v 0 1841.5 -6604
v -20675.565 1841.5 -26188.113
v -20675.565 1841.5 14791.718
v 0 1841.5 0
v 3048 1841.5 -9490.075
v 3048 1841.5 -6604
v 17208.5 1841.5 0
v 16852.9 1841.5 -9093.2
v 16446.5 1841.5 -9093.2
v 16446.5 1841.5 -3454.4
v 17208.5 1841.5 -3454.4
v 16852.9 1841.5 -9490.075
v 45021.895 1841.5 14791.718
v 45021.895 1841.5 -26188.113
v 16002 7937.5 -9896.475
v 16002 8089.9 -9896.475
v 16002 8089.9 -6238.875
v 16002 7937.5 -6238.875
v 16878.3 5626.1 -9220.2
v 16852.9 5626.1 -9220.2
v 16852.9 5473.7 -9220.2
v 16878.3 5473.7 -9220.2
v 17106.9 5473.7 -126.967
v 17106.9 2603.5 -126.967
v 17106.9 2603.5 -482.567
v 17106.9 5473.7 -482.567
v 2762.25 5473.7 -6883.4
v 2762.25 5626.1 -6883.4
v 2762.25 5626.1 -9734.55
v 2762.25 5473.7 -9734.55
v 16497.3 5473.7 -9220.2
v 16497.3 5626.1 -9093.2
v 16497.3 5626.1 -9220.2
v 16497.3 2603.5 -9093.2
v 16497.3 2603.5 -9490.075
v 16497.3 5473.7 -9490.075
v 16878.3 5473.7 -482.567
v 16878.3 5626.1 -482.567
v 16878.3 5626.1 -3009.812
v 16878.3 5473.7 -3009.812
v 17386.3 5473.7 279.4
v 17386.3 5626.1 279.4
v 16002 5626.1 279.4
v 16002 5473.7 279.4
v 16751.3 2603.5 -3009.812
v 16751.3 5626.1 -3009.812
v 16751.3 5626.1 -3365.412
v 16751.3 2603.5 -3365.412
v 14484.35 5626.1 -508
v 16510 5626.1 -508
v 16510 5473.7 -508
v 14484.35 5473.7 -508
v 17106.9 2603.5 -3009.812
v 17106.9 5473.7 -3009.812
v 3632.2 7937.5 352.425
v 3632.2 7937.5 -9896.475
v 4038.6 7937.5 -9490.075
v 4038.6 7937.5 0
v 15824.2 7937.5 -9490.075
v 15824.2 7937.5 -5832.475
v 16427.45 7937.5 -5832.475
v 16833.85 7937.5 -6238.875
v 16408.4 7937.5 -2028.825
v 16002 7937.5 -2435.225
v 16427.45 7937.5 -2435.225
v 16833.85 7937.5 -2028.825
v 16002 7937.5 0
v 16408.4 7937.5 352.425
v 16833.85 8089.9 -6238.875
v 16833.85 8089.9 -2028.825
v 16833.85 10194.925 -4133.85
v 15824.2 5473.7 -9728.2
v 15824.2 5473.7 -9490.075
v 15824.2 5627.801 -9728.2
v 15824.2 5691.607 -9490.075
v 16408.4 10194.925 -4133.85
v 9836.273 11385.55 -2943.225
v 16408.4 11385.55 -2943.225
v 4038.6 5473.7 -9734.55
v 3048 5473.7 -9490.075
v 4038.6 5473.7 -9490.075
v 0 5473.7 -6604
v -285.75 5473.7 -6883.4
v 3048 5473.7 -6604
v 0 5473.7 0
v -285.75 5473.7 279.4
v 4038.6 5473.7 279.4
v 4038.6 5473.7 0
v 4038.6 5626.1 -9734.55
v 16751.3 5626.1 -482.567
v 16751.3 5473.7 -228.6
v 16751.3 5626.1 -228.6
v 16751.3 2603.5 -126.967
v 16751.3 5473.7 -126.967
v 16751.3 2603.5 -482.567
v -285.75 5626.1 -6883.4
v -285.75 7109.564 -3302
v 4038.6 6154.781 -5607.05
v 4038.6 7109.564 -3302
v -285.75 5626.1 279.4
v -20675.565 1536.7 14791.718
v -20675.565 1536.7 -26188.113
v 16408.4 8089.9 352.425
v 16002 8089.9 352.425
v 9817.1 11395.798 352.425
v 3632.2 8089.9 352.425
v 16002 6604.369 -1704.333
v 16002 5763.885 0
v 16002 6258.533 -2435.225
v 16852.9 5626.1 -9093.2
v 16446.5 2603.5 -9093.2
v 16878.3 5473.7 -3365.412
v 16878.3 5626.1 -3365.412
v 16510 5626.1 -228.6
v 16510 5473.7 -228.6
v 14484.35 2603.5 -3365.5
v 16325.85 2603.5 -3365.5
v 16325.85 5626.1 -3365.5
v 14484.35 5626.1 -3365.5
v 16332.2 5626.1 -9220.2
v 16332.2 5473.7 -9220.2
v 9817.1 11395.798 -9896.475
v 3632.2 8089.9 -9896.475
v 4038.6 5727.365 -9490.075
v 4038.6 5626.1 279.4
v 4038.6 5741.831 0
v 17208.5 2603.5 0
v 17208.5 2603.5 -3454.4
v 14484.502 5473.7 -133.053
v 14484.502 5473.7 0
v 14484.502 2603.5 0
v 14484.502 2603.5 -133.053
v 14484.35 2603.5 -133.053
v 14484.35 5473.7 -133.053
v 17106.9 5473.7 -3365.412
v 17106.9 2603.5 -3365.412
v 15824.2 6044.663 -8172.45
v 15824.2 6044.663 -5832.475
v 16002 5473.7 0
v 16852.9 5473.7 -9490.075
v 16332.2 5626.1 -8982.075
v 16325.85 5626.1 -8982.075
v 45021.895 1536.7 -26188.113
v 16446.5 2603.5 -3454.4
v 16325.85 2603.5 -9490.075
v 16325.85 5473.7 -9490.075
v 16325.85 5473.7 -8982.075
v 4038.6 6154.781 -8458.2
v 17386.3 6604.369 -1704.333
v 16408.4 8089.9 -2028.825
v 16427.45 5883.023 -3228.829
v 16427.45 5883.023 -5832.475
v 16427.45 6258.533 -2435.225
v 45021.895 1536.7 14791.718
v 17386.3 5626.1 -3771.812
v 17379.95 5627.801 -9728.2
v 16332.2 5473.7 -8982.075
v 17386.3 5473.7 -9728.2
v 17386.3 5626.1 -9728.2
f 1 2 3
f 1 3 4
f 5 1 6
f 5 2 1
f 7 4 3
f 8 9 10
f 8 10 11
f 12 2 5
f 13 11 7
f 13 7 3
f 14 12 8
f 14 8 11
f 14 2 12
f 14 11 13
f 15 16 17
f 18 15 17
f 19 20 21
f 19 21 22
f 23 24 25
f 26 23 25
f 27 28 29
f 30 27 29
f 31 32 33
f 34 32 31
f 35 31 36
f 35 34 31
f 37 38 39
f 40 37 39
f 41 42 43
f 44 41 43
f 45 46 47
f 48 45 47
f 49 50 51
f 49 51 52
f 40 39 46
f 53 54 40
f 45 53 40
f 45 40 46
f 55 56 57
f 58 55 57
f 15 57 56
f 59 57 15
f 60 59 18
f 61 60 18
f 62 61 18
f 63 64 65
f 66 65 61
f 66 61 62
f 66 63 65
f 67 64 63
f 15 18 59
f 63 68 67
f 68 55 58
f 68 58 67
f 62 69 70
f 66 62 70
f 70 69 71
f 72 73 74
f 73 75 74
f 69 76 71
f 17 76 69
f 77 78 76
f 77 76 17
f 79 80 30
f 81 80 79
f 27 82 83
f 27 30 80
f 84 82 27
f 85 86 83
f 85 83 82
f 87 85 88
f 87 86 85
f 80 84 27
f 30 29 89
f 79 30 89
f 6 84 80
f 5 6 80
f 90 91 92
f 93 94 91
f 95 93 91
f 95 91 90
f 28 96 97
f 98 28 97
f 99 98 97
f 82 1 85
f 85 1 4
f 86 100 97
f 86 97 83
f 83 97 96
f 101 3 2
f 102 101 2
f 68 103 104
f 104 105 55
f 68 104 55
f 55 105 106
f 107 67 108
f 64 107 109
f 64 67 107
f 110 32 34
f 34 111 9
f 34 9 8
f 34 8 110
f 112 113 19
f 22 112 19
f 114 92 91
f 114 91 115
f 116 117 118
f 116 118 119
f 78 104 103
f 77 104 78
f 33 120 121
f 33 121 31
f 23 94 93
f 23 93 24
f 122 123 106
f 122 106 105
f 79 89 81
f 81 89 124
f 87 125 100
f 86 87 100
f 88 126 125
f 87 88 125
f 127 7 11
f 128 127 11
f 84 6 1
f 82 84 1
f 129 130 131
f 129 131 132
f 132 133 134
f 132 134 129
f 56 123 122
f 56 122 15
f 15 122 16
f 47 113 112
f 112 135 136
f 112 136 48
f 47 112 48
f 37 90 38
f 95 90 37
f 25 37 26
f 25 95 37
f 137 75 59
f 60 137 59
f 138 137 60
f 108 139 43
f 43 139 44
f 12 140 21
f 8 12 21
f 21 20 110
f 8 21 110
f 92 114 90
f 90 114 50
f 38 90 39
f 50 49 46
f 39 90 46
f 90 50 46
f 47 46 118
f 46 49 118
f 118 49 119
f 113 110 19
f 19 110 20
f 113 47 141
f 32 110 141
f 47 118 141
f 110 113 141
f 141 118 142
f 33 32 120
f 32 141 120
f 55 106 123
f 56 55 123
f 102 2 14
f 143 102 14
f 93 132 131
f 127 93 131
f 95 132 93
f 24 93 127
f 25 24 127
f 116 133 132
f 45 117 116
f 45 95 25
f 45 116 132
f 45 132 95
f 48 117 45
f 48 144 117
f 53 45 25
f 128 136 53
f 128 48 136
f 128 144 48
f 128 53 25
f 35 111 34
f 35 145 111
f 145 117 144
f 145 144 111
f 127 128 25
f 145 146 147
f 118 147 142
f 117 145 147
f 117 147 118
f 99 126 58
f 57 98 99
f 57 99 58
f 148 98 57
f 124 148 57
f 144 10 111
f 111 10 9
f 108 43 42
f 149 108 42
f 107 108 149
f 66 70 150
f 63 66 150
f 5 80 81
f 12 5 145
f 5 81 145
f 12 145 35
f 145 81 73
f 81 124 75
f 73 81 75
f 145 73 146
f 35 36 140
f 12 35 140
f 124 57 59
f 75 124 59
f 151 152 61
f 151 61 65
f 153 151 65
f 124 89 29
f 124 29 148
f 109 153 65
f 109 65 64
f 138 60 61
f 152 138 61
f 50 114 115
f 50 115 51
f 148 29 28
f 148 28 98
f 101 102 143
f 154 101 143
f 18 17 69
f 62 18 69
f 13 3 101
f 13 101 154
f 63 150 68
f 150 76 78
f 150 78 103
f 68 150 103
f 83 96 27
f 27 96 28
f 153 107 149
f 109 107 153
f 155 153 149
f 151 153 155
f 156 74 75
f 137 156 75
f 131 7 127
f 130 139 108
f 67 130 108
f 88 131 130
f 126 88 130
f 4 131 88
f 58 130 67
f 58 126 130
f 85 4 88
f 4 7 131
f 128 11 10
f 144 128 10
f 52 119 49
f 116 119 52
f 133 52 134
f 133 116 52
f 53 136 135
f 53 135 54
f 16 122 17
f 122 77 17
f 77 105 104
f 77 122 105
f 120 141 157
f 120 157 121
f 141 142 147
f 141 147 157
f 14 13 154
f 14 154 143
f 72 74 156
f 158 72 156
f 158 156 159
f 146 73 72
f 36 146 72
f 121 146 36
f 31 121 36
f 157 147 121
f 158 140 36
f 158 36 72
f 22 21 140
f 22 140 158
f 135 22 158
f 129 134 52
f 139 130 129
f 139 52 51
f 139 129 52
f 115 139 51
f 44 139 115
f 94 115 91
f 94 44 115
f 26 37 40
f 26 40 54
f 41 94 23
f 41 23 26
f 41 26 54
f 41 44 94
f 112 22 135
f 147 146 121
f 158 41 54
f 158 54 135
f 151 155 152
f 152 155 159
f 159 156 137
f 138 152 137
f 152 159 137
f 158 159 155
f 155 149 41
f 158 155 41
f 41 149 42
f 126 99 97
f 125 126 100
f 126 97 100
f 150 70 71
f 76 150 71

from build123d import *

# Parameters (mm, degrees)
BOSS_EXTRUDE1_DEPTH              = 2603.5
BOSS_EXTRUDE2_DEPTH              = 3022.6
BOSS_EXTRUDE3_DEPTH              = 2463.8
SKETCH4_W                        = 65697.460420921
SKETCH4_H                        = 40979.830360303
BOSS_EXTRUDE4_DEPTH              = 304.8
SKETCH5_W                        = 21895.016639369
SKETCH5_H                        = 12322.560301516
CUT_EXTRUDE1_DEPTH               = 1905
BOSS_EXTRUDE5_REACH              = 52955.248
BOSS_EXTRUDE6_REACH              = 51905.327
CUT_EXTRUDE2_DEPTH               = 1276.35
BOSS_EXTRUDE7_REACH              = 51982.038
BOSS_EXTRUDE8_DEPTH              = 406.4
CUT_EXTRUDE3_DEPTH               = 11303
BOSS_EXTRUDE9_REACH              = 47146.859
BOSS_EXTRUDE10_START             = -6572.127481
BOSS_EXTRUDE10_DEPTH             = 6572.127481
SKETCH15_W                       = 355.6
SKETCH15_H                       = 355.6
BOSS_EXTRUDE11_DEPTH             = 3022.6
BOSS_EXTRUDE12_DEPTH             = 7362.952
CUT_EXTRUDE4_DEPTH               = 304.8
CUT_EXTRUDE4_DEPTH_BACK          = 1308.1
BOSS_EXTRUDE13_REACH             = 47384.657
BOSS_EXTRUDE13_DIRECTION_2_DEPTH = 254
SKETCH19_W                       = 14484.502299334
SKETCH19_H                       = 133.052541355
BOSS_EXTRUDE14_DEPTH             = 3022.6
SKETCH20_W                       = 10445.902299334
SKETCH20_H                       = 57.769049229
BOSS_EXTRUDE15_DEPTH             = 2601.214
SKETCH22_W                       = 53.975
SKETCH22_H                       = 2463.8
BOSS_EXTRUDE17_DEPTH             = 1517.497700666
BOSS_EXTRUDE18_DEPTH             = 3022.6
BOSS_EXTRUDE19_DEPTH             = 3784.6
BOSS_EXTRUDE20_DEPTH             = 152.4
BOSS_EXTRUDE21_DEPTH             = 152.4
SKETCH27_W                       = 171.45
SKETCH27_H                       = 2870.2
CUT_EXTRUDE5_DEPTH               = 405.13


with BuildPart() as part:
    # Sketch1 → Boss-Extrude1 (new body)
    with BuildSketch(Plane(origin=(0, 0, 0), x_dir=(1, 0, 0), z_dir=(0, 1, 0))):
        Polygon((0, 0), (17208.5, 0), (17208.5, 3454.4), (16446.5, 3454.4), (16446.5, 9093.2), (16852.9, 9093.2), (16852.9, 9448.8), (16446.5, 9448.8), (3048, 9448.8), (3048, 6604), (0, 6604), align=None)
    extrude(amount=BOSS_EXTRUDE1_DEPTH)

    # Sketch2 → Boss-Extrude2 (add)
    with BuildSketch(Plane(origin=(0, 2603.5, 0), x_dir=(1, 0, 0), z_dir=(0, 1, 0))):
        Polygon((120.65, 127), (120.65, 6477), (3168.65, 6477), (3168.65, 9328.15), (16325.85, 9328.15), (16325.85, 3365.5), (14484.35, 3365.5), (14484.35, 127), align=None)
    extrude(amount=BOSS_EXTRUDE2_DEPTH)

    # Sketch3 → Boss-Extrude3 (add)
    with BuildSketch(Plane(origin=(0, 5626.1, 0), x_dir=(1, 0, 0), z_dir=(0, 1, 0))):
        Polygon((4038.6, 9490.075), (15824.2, 9490.075), (15824.2, 5832.475), (16427.45, 5832.475), (16427.45, 2435.225), (16002, 2435.225), (16002, 53.975), (4038.6, 53.975), align=None)
    extrude(amount=BOSS_EXTRUDE3_DEPTH)

    # Sketch4 → Boss-Extrude4 (add)
    with BuildSketch(Plane(origin=(0, 1841.5, 0), x_dir=(1, 0, 0), z_dir=(0, 1, 0))):
        with Locations((12173.164818329, 5698.197471797)):
            Rectangle(SKETCH4_W, SKETCH4_H)
    extrude(amount=-BOSS_EXTRUDE4_DEPTH)

    # Sketch5 → Cut-Extrude1 (cut)
    with BuildSketch(Plane.XZ.offset(-1536.7)):
        with Locations((8389.493403635, -5047.013792364)):
            Rectangle(SKETCH5_W, SKETCH5_H)
    extrude(amount=CUT_EXTRUDE1_DEPTH, mode=Mode.SUBTRACT)

    # Boss-Extrude5: up to this face of the body (flat: up to its plane)
    boss_extrude5_end = Plane(part.part.faces().sort_by_distance((4038.6, 6858, -4772.025))[0])
    # Sketch6 → Boss-Extrude5 (add, up to the picked face)
    with BuildSketch(Plane.ZY.offset(285.75), mode=Mode.PRIVATE) as boss_extrude5_sk1:
        Polygon((-127, 5626.1), (-6477, 5626.1), (-6883.4, 5626.1), (-3302, 7109.564452283), (279.4, 5626.1), align=None)
    boss_extrude5_tool1 = split(extrude(boss_extrude5_sk1.sketch, amount=-BOSS_EXTRUDE5_REACH, mode=Mode.PRIVATE), bisect_by=boss_extrude5_end, keep=Keep.BOTH, mode=Mode.PRIVATE)
    add(boss_extrude5_tool1.solids().sort_by(Axis((-285.75, 6120.588151, -3302), (1, 0, 0)))[0])

    # Boss-Extrude6: up to this plane
    boss_extrude6_end = Plane(origin=(11353.4048929, 5626.1, -6883.4), z_dir=(0, 0.9238795325112832, -0.38268343236509844))
    # Sketch8 → Boss-Extrude6 (add, up to the surface)
    with BuildSketch(Plane(origin=(0, 0, -9734.55), x_dir=(-1, 0, 0), z_dir=(0, 0, -1)), mode=Mode.PRIVATE) as boss_extrude6_sk1:
        Polygon((-4038.6, 5626.1), (-3168.65, 5626.1), (-2762.25, 5626.1), (-4038.6, 6154.781480335), align=None)
    boss_extrude6_tool1 = split(extrude(boss_extrude6_sk1.sketch, amount=-BOSS_EXTRUDE6_REACH, mode=Mode.PRIVATE), bisect_by=boss_extrude6_end, keep=Keep.BOTH, mode=Mode.PRIVATE)
    add(boss_extrude6_tool1.solids().sort_by_distance((3613.15, 5802.32716, -9734.55))[0])

    # Sketch9 → Cut-Extrude2 (cut)
    with BuildSketch(Plane.ZY.offset(-2762.25)):
        Polygon((-9734.55, 5626.1), (-8458.2, 6154.781480335), (-9734.55, 6154.781480335), align=None)
    extrude(amount=-CUT_EXTRUDE2_DEPTH, mode=Mode.SUBTRACT)

    # Boss-Extrude7: up to this face of the body (flat: up to its plane)
    boss_extrude7_end = Plane(part.part.faces().sort_by_distance((10020.3, 6858, -53.975))[0])
    # Sketch10 → Boss-Extrude7 (add, up to the picked face)
    with BuildSketch(Plane(origin=(0, 0, -9896.475), x_dir=(-1, 0, 0), z_dir=(0, 0, -1)), mode=Mode.PRIVATE) as boss_extrude7_sk1:
        Polygon((-4038.6, 8089.9), (-15824.2, 8089.9), (-16230.6, 8089.9), (-9931.4, 11456.892547581), (-3632.2, 8089.9), align=None)
    boss_extrude7_tool1 = split(extrude(boss_extrude7_sk1.sketch, amount=-BOSS_EXTRUDE7_REACH, mode=Mode.PRIVATE), bisect_by=boss_extrude7_end, keep=Keep.BOTH, mode=Mode.PRIVATE)
    add(boss_extrude7_tool1.solids().sort_by(Axis((9931.4, 9212.230849, -9896.475), (0, 0, 1)))[0])

    # Sketch11 → Boss-Extrude8 (add)
    with BuildSketch(Plane.XY.offset(-53.975)):
        Polygon((3632.2, 8089.9), (9931.4, 11456.892547581), (16230.6, 8089.9), align=None)
    extrude(amount=BOSS_EXTRUDE8_DEPTH)

    # Sketch12 → Cut-Extrude3 (cut)
    with BuildSketch(Plane.XY.offset(352.425)):
        Polygon((16002, 8089.9), (16230.6, 8089.9), (9931.4, 11456.892547581), (9817.1, 11395.797924742), align=None)
    extrude(amount=-CUT_EXTRUDE3_DEPTH, mode=Mode.SUBTRACT)

    # Boss-Extrude9: up to this plane
    boss_extrude9_end = Plane(origin=(16002, 8089.9, -10950.575), z_dir=(-0.47139673682599864, -0.8819212643483546, 0))
    # Sketch13 → Boss-Extrude9 (add, up to the surface)
    with BuildSketch(Plane(origin=(16833.85, 0, 0), x_dir=(0, 0, -1), z_dir=(1, 0, 0)), mode=Mode.PRIVATE) as boss_extrude9_sk1:
        Polygon((5832.475, 8089.9), (2435.225, 8089.9), (2028.825, 8089.9), (4133.85, 10194.925), (6238.875, 8089.9), align=None)
    boss_extrude9_tool1 = split(extrude(boss_extrude9_sk1.sketch, amount=-BOSS_EXTRUDE9_REACH, mode=Mode.PRIVATE), bisect_by=boss_extrude9_end, keep=Keep.BOTH, mode=Mode.PRIVATE)
    add(boss_extrude9_tool1.solids().sort_by_distance((16833.85, 8791.575, -4133.85))[0])

    # Sketch14 → Boss-Extrude10 (add)
    with BuildSketch(Plane(origin=(16408.4, 0, 0), x_dir=(0, 0, -1), z_dir=(1, 0, 0)).offset(BOSS_EXTRUDE10_START)):
        Polygon((-352.425, 8089.9), (2943.225, 11385.55), (4133.85, 10194.925), (2028.825, 8089.9), align=None)
    extrude(amount=BOSS_EXTRUDE10_DEPTH)

    # Sketch15 → Boss-Extrude11 (add)
    with BuildSketch(Plane(origin=(0, 2603.5, 0), x_dir=(1, 0, 0), z_dir=(0, 1, 0))):
        with Locations((16675.1, 9271)):
            Rectangle(SKETCH15_W, SKETCH15_H)
        Polygon((17106.9, 3009.811581855), (16751.3, 3009.811581855), (16751.3, 3365.411581855), (16778.823557109, 3365.411581855), (17106.9, 3365.411581855), align=None)
        with Locations((16929.1, 304.76670394)):
            Rectangle(SKETCH15_W, SKETCH15_H)
    extrude(amount=BOSS_EXTRUDE11_DEPTH)

    # Sketch16 → Boss-Extrude12 (add)
    with BuildSketch(Plane(origin=(0, 0, -9728.2), x_dir=(-1, 0, 0), z_dir=(0, 0, -1))):
        Polygon((-15824.2, 5626.1), (-17106.9, 5626.1), (-17386.3, 5626.1), (-15824.2, 6044.663433497), align=None)
    extrude(amount=-BOSS_EXTRUDE12_DEPTH)

    # Sketch17 → Cut-Extrude4 (cut, two sides)
    with BuildSketch(Plane(origin=(17132.3, 0, 0), x_dir=(0, 0, -1), z_dir=(1, 0, 0))) as cut_extrude4_sk:
        Polygon((9734.55, 5626.1), (8172.45, 6044.663433497), (9728.2, 6044.663433497), align=None)
    extrude(amount=CUT_EXTRUDE4_DEPTH, mode=Mode.SUBTRACT)
    extrude(cut_extrude4_sk.sketch, amount=-CUT_EXTRUDE4_DEPTH_BACK, mode=Mode.SUBTRACT)

    # Boss-Extrude13: up to this face of the body (flat: up to its plane)
    boss_extrude13_end = Plane(part.part.faces().sort_by_distance((16002, 6862.650151337, -1239.464598139))[0])
    # Sketch18 → Boss-Extrude13 (add, up to the picked face)
    with BuildSketch(Plane(origin=(17132.3, 0, 0), x_dir=(0, 0, -1), z_dir=(1, 0, 0)), mode=Mode.PRIVATE) as boss_extrude13_sk1:
        Polygon((-279.4, 5626.1), (1704.333383775, 6604.369044674), (3771.811581855, 5626.1), (3365.411581855, 5626.1), (126.96670394, 5626.1), align=None)
    boss_extrude13_tool1 = split(extrude(boss_extrude13_sk1.sketch, amount=-BOSS_EXTRUDE13_REACH, mode=Mode.PRIVATE), bisect_by=boss_extrude13_end, keep=Keep.BOTH, mode=Mode.PRIVATE)
    add(boss_extrude13_tool1.solids().sort_by(Axis((17132.3, 5952.189682, -1732.248322), (-1, 0, 0)))[0])

    # Sketch18 → Boss-Extrude13 direction 2 (add)
    with BuildSketch(Plane(origin=(17132.3, 0, 0), x_dir=(0, 0, -1), z_dir=(1, 0, 0))):
        Polygon((-279.4, 5626.1), (1704.333383775, 6604.369044674), (3771.811581855, 5626.1), (3365.411581855, 5626.1), (126.96670394, 5626.1), align=None)
    extrude(amount=BOSS_EXTRUDE13_DIRECTION_2_DEPTH)

    # Sketch19 → Boss-Extrude14 (add)
    with BuildSketch(Plane(origin=(0, 2603.5, 0), x_dir=(1, 0, 0), z_dir=(0, 1, 0))):
        with Locations((7242.251149667, 66.526270678)):
            Rectangle(SKETCH19_W, SKETCH19_H)
    extrude(amount=BOSS_EXTRUDE14_DEPTH)

    # Sketch20 → Boss-Extrude15 (add)
    with BuildSketch(Plane(origin=(0, 5626.1, 0), x_dir=(1, 0, 0), z_dir=(0, 1, 0))):
        with Locations((9261.551149667, 28.884524615)):
            Rectangle(SKETCH20_W, SKETCH20_H)
    extrude(amount=BOSS_EXTRUDE15_DEPTH)

    # Sketch22 → Boss-Extrude17 (add)
    with BuildSketch(Plane(origin=(14484.502299334, 0, 0), x_dir=(0, 0, -1), z_dir=(1, 0, 0))):
        with Locations((26.9875, 6858)):
            Rectangle(SKETCH22_W, SKETCH22_H)
    extrude(amount=BOSS_EXTRUDE17_DEPTH)

    # Sketch23 → Boss-Extrude18 (add)
    with BuildSketch(Plane(origin=(0, 2603.5, 0), x_dir=(1, 0, 0), z_dir=(0, 1, 0))):
        Polygon((0, 6604), (0, 133.052541355), (120.65, 133.052541355), (120.65, 6477), (3168.65, 6477), (3168.65, 9328.15), (16497.3, 9328.15), (16497.3, 9448.8), (3168.65, 9448.8), (3048, 9448.8), (3048, 6604), align=None)
    extrude(amount=BOSS_EXTRUDE18_DEPTH)

    # Sketch24 → Boss-Extrude19 (add)
    with BuildSketch(Plane.XZ.offset(-5626.1)):
        Polygon((16852.9, -9448.8), (4038.6, -9448.8), (3048, -9448.8), (3048, -9490.075), (4038.6, -9490.075), (16852.9, -9490.075), align=None)
    extrude(amount=BOSS_EXTRUDE19_DEPTH)

    # Sketch25 → Boss-Extrude20 (add)
    with BuildSketch(Plane.XZ.offset(-8089.9)):
        Polygon((3632.2, 352.425), (3632.2, -9896.475), (16002, -9896.475), (16002, -6238.875), (16833.85, -6238.875), (16833.85, -2028.825), (16408.4, -2028.825), (16408.4, 352.425), (16002, 352.425), align=None)
        Polygon((4140.2, -155.575), (4140.2, -9388.475), (15494, -9388.475), (15494, -5730.875), (16325.85, -5730.875), (16325.85, -2536.825), (15900.4, -2536.825), (15900.4, -155.575), align=None, mode=Mode.SUBTRACT)
    extrude(amount=BOSS_EXTRUDE20_DEPTH)

    # Sketch26 → Boss-Extrude21 (add)
    with BuildSketch(Plane.XZ.offset(-5626.1)):
        Polygon((4038.6, 0), (4038.6, 279.4), (-285.75, 279.4), (-285.75, -6883.4), (2762.25, -6883.4), (2762.25, -9734.55), (4038.6, -9734.55), (4038.6, -9490.075), (15824.2, -9490.075), (15824.2, -9728.2), (17386.3, -9728.2), (17386.3, -3771.811581855), (17386.3, 279.4), (16002, 279.4), (16002, 0), align=None)
        Polygon((3530.6, -508), (3530.6, -228.6), (222.25, -228.6), (222.25, -6375.4), (3270.25, -6375.4), (3270.25, -9226.55), (3530.6, -9226.55), (3530.6, -8982.075), (16332.2, -8982.075), (16332.2, -9220.2), (16878.3, -9220.2), (16878.3, -3771.811581855), (16878.3, -228.6), (16510, -228.6), (16510, -508), align=None, mode=Mode.SUBTRACT)
    extrude(amount=BOSS_EXTRUDE21_DEPTH)

    # Sketch27 → Cut-Extrude5 (cut)
    with BuildSketch(Plane.XY.offset(-9328.15)):
        with Locations((16411.575, 4038.6)):
            Rectangle(SKETCH27_W, SKETCH27_H)
    extrude(amount=-CUT_EXTRUDE5_DEPTH, mode=Mode.SUBTRACT)


solid = part.part
